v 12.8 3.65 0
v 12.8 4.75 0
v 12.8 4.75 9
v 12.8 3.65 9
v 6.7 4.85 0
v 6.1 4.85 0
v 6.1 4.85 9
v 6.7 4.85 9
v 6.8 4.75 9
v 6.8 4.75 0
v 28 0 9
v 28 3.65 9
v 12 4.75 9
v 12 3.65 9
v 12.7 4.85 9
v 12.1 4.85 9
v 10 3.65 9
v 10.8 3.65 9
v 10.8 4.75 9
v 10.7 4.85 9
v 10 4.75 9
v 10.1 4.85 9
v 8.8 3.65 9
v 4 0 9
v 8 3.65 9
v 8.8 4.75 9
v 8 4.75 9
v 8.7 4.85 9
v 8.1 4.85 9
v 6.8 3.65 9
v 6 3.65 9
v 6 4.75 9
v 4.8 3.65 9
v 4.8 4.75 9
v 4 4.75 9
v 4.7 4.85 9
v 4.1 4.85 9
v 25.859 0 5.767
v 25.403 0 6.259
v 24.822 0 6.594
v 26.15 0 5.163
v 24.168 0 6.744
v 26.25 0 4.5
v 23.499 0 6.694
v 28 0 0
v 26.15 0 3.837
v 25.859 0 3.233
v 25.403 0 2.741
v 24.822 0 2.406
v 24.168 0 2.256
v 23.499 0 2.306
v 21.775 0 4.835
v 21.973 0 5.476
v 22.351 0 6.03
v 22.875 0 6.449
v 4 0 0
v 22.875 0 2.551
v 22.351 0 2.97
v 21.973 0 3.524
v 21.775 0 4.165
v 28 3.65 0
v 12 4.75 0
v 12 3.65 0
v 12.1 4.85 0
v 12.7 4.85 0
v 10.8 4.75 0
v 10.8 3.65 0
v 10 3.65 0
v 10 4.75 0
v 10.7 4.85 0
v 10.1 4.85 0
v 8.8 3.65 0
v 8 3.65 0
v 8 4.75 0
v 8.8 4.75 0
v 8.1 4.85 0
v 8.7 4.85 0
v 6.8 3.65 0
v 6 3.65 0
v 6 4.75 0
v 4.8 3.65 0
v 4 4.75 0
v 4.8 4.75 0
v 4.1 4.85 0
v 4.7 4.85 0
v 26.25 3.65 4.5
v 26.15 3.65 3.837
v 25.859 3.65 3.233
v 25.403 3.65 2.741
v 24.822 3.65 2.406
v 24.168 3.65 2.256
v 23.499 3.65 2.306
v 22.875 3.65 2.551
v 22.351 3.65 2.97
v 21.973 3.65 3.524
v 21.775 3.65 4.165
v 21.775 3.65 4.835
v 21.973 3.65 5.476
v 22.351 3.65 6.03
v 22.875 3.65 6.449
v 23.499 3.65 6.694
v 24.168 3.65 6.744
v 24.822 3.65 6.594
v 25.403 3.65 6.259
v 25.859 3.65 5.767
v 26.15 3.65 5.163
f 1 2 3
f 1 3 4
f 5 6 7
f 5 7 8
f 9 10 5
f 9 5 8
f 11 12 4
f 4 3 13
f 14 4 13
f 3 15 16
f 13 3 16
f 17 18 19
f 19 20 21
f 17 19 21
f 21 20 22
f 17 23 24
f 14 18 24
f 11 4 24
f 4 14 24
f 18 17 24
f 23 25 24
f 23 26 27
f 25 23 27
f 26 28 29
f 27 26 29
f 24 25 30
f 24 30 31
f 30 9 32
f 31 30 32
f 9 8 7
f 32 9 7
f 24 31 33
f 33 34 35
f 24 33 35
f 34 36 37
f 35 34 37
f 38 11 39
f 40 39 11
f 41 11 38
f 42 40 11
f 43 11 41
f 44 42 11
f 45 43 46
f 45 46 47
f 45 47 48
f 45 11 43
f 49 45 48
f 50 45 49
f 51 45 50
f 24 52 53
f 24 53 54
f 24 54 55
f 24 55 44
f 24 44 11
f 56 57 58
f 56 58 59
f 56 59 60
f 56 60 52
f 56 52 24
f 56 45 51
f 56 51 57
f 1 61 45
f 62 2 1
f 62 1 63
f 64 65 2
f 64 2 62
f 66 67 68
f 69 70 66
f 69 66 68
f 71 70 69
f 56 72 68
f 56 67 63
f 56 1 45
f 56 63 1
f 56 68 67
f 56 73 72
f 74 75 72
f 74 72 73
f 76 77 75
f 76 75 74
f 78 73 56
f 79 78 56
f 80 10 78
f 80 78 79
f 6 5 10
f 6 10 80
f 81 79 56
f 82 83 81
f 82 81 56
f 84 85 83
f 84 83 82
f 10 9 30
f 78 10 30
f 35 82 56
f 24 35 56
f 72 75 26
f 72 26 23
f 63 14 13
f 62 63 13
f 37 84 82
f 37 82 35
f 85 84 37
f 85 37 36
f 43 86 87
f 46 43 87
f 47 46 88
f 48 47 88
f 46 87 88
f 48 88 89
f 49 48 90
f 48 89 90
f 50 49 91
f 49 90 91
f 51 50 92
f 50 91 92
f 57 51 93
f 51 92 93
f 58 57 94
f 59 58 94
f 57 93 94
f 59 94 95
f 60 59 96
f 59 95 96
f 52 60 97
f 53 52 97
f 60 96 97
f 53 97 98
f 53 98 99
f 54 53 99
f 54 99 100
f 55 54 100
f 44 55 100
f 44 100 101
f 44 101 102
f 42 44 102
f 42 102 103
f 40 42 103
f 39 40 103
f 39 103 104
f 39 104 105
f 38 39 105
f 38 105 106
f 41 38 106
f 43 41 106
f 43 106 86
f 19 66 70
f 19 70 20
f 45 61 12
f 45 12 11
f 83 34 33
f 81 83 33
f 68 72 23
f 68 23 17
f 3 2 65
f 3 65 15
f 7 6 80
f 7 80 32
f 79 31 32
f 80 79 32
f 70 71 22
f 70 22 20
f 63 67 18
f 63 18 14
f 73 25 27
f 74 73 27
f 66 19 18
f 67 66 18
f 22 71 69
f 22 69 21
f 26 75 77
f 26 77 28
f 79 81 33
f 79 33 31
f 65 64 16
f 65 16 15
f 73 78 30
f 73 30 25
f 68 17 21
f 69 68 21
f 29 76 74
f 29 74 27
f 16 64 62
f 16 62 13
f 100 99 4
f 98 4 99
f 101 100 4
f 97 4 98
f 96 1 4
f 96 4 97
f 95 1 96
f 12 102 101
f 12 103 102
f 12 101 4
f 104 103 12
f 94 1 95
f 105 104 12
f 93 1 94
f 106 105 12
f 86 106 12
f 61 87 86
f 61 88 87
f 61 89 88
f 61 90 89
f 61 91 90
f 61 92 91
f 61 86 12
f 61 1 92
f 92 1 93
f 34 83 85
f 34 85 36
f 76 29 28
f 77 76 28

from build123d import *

# Parameters (mm, degrees)
BOSS_EXTRUDE1_DEPTH = 9
CHAMFER1_SIZE       = 0.1
SKETCH2_R           = 2.25
CUT_EXTRUDE1_DEPTH  = 4.65


with BuildPart() as part:
    # Sketch1 → Boss-Extrude1 (new body)
    with BuildSketch(Plane.XY):
        Polygon((28, 3.65), (28, 0), (4, 0), (4, 3.65), (4, 4.85), (4.8, 4.85), (4.8, 3.65), (6, 3.65), (6, 4.85), (6.8, 4.85), (6.8, 3.65), (8, 3.65), (8, 4.85), (8.8, 4.85), (8.8, 3.65), (10, 3.65), (10, 4.85), (10.8, 4.85), (10.8, 3.65), (12, 3.65), (12, 4.85), (12.8, 4.85), (12.8, 3.65), align=None)
    extrude(amount=BOSS_EXTRUDE1_DEPTH)

    # Chamfer1
    chamfer1_edges = [part.edges().sort_by_distance(p)[0] for p in [
        (4, 4.85, 4.5),
        (4.8, 4.85, 4.5),
        (6, 4.85, 4.5),
        (6.8, 4.85, 4.5),
        (8, 4.85, 4.5),
        (8.8, 4.85, 4.5),
        (10, 4.85, 4.5),
        (10.8, 4.85, 4.5),
        (12, 4.85, 4.5),
        (12.8, 4.85, 4.5),
    ]]
    chamfer(chamfer1_edges, length=CHAMFER1_SIZE)

    # Sketch2 → Cut-Extrude1 (cut, through all)
    with BuildSketch(Plane(origin=(0, 3.65, 0), x_dir=(1, 0, 0), z_dir=(0, 1, 0))):
        with Locations((24, -4.5)):
            Circle(SKETCH2_R)
    extrude(amount=-CUT_EXTRUDE1_DEPTH, mode=Mode.SUBTRACT)


solid = part.part
